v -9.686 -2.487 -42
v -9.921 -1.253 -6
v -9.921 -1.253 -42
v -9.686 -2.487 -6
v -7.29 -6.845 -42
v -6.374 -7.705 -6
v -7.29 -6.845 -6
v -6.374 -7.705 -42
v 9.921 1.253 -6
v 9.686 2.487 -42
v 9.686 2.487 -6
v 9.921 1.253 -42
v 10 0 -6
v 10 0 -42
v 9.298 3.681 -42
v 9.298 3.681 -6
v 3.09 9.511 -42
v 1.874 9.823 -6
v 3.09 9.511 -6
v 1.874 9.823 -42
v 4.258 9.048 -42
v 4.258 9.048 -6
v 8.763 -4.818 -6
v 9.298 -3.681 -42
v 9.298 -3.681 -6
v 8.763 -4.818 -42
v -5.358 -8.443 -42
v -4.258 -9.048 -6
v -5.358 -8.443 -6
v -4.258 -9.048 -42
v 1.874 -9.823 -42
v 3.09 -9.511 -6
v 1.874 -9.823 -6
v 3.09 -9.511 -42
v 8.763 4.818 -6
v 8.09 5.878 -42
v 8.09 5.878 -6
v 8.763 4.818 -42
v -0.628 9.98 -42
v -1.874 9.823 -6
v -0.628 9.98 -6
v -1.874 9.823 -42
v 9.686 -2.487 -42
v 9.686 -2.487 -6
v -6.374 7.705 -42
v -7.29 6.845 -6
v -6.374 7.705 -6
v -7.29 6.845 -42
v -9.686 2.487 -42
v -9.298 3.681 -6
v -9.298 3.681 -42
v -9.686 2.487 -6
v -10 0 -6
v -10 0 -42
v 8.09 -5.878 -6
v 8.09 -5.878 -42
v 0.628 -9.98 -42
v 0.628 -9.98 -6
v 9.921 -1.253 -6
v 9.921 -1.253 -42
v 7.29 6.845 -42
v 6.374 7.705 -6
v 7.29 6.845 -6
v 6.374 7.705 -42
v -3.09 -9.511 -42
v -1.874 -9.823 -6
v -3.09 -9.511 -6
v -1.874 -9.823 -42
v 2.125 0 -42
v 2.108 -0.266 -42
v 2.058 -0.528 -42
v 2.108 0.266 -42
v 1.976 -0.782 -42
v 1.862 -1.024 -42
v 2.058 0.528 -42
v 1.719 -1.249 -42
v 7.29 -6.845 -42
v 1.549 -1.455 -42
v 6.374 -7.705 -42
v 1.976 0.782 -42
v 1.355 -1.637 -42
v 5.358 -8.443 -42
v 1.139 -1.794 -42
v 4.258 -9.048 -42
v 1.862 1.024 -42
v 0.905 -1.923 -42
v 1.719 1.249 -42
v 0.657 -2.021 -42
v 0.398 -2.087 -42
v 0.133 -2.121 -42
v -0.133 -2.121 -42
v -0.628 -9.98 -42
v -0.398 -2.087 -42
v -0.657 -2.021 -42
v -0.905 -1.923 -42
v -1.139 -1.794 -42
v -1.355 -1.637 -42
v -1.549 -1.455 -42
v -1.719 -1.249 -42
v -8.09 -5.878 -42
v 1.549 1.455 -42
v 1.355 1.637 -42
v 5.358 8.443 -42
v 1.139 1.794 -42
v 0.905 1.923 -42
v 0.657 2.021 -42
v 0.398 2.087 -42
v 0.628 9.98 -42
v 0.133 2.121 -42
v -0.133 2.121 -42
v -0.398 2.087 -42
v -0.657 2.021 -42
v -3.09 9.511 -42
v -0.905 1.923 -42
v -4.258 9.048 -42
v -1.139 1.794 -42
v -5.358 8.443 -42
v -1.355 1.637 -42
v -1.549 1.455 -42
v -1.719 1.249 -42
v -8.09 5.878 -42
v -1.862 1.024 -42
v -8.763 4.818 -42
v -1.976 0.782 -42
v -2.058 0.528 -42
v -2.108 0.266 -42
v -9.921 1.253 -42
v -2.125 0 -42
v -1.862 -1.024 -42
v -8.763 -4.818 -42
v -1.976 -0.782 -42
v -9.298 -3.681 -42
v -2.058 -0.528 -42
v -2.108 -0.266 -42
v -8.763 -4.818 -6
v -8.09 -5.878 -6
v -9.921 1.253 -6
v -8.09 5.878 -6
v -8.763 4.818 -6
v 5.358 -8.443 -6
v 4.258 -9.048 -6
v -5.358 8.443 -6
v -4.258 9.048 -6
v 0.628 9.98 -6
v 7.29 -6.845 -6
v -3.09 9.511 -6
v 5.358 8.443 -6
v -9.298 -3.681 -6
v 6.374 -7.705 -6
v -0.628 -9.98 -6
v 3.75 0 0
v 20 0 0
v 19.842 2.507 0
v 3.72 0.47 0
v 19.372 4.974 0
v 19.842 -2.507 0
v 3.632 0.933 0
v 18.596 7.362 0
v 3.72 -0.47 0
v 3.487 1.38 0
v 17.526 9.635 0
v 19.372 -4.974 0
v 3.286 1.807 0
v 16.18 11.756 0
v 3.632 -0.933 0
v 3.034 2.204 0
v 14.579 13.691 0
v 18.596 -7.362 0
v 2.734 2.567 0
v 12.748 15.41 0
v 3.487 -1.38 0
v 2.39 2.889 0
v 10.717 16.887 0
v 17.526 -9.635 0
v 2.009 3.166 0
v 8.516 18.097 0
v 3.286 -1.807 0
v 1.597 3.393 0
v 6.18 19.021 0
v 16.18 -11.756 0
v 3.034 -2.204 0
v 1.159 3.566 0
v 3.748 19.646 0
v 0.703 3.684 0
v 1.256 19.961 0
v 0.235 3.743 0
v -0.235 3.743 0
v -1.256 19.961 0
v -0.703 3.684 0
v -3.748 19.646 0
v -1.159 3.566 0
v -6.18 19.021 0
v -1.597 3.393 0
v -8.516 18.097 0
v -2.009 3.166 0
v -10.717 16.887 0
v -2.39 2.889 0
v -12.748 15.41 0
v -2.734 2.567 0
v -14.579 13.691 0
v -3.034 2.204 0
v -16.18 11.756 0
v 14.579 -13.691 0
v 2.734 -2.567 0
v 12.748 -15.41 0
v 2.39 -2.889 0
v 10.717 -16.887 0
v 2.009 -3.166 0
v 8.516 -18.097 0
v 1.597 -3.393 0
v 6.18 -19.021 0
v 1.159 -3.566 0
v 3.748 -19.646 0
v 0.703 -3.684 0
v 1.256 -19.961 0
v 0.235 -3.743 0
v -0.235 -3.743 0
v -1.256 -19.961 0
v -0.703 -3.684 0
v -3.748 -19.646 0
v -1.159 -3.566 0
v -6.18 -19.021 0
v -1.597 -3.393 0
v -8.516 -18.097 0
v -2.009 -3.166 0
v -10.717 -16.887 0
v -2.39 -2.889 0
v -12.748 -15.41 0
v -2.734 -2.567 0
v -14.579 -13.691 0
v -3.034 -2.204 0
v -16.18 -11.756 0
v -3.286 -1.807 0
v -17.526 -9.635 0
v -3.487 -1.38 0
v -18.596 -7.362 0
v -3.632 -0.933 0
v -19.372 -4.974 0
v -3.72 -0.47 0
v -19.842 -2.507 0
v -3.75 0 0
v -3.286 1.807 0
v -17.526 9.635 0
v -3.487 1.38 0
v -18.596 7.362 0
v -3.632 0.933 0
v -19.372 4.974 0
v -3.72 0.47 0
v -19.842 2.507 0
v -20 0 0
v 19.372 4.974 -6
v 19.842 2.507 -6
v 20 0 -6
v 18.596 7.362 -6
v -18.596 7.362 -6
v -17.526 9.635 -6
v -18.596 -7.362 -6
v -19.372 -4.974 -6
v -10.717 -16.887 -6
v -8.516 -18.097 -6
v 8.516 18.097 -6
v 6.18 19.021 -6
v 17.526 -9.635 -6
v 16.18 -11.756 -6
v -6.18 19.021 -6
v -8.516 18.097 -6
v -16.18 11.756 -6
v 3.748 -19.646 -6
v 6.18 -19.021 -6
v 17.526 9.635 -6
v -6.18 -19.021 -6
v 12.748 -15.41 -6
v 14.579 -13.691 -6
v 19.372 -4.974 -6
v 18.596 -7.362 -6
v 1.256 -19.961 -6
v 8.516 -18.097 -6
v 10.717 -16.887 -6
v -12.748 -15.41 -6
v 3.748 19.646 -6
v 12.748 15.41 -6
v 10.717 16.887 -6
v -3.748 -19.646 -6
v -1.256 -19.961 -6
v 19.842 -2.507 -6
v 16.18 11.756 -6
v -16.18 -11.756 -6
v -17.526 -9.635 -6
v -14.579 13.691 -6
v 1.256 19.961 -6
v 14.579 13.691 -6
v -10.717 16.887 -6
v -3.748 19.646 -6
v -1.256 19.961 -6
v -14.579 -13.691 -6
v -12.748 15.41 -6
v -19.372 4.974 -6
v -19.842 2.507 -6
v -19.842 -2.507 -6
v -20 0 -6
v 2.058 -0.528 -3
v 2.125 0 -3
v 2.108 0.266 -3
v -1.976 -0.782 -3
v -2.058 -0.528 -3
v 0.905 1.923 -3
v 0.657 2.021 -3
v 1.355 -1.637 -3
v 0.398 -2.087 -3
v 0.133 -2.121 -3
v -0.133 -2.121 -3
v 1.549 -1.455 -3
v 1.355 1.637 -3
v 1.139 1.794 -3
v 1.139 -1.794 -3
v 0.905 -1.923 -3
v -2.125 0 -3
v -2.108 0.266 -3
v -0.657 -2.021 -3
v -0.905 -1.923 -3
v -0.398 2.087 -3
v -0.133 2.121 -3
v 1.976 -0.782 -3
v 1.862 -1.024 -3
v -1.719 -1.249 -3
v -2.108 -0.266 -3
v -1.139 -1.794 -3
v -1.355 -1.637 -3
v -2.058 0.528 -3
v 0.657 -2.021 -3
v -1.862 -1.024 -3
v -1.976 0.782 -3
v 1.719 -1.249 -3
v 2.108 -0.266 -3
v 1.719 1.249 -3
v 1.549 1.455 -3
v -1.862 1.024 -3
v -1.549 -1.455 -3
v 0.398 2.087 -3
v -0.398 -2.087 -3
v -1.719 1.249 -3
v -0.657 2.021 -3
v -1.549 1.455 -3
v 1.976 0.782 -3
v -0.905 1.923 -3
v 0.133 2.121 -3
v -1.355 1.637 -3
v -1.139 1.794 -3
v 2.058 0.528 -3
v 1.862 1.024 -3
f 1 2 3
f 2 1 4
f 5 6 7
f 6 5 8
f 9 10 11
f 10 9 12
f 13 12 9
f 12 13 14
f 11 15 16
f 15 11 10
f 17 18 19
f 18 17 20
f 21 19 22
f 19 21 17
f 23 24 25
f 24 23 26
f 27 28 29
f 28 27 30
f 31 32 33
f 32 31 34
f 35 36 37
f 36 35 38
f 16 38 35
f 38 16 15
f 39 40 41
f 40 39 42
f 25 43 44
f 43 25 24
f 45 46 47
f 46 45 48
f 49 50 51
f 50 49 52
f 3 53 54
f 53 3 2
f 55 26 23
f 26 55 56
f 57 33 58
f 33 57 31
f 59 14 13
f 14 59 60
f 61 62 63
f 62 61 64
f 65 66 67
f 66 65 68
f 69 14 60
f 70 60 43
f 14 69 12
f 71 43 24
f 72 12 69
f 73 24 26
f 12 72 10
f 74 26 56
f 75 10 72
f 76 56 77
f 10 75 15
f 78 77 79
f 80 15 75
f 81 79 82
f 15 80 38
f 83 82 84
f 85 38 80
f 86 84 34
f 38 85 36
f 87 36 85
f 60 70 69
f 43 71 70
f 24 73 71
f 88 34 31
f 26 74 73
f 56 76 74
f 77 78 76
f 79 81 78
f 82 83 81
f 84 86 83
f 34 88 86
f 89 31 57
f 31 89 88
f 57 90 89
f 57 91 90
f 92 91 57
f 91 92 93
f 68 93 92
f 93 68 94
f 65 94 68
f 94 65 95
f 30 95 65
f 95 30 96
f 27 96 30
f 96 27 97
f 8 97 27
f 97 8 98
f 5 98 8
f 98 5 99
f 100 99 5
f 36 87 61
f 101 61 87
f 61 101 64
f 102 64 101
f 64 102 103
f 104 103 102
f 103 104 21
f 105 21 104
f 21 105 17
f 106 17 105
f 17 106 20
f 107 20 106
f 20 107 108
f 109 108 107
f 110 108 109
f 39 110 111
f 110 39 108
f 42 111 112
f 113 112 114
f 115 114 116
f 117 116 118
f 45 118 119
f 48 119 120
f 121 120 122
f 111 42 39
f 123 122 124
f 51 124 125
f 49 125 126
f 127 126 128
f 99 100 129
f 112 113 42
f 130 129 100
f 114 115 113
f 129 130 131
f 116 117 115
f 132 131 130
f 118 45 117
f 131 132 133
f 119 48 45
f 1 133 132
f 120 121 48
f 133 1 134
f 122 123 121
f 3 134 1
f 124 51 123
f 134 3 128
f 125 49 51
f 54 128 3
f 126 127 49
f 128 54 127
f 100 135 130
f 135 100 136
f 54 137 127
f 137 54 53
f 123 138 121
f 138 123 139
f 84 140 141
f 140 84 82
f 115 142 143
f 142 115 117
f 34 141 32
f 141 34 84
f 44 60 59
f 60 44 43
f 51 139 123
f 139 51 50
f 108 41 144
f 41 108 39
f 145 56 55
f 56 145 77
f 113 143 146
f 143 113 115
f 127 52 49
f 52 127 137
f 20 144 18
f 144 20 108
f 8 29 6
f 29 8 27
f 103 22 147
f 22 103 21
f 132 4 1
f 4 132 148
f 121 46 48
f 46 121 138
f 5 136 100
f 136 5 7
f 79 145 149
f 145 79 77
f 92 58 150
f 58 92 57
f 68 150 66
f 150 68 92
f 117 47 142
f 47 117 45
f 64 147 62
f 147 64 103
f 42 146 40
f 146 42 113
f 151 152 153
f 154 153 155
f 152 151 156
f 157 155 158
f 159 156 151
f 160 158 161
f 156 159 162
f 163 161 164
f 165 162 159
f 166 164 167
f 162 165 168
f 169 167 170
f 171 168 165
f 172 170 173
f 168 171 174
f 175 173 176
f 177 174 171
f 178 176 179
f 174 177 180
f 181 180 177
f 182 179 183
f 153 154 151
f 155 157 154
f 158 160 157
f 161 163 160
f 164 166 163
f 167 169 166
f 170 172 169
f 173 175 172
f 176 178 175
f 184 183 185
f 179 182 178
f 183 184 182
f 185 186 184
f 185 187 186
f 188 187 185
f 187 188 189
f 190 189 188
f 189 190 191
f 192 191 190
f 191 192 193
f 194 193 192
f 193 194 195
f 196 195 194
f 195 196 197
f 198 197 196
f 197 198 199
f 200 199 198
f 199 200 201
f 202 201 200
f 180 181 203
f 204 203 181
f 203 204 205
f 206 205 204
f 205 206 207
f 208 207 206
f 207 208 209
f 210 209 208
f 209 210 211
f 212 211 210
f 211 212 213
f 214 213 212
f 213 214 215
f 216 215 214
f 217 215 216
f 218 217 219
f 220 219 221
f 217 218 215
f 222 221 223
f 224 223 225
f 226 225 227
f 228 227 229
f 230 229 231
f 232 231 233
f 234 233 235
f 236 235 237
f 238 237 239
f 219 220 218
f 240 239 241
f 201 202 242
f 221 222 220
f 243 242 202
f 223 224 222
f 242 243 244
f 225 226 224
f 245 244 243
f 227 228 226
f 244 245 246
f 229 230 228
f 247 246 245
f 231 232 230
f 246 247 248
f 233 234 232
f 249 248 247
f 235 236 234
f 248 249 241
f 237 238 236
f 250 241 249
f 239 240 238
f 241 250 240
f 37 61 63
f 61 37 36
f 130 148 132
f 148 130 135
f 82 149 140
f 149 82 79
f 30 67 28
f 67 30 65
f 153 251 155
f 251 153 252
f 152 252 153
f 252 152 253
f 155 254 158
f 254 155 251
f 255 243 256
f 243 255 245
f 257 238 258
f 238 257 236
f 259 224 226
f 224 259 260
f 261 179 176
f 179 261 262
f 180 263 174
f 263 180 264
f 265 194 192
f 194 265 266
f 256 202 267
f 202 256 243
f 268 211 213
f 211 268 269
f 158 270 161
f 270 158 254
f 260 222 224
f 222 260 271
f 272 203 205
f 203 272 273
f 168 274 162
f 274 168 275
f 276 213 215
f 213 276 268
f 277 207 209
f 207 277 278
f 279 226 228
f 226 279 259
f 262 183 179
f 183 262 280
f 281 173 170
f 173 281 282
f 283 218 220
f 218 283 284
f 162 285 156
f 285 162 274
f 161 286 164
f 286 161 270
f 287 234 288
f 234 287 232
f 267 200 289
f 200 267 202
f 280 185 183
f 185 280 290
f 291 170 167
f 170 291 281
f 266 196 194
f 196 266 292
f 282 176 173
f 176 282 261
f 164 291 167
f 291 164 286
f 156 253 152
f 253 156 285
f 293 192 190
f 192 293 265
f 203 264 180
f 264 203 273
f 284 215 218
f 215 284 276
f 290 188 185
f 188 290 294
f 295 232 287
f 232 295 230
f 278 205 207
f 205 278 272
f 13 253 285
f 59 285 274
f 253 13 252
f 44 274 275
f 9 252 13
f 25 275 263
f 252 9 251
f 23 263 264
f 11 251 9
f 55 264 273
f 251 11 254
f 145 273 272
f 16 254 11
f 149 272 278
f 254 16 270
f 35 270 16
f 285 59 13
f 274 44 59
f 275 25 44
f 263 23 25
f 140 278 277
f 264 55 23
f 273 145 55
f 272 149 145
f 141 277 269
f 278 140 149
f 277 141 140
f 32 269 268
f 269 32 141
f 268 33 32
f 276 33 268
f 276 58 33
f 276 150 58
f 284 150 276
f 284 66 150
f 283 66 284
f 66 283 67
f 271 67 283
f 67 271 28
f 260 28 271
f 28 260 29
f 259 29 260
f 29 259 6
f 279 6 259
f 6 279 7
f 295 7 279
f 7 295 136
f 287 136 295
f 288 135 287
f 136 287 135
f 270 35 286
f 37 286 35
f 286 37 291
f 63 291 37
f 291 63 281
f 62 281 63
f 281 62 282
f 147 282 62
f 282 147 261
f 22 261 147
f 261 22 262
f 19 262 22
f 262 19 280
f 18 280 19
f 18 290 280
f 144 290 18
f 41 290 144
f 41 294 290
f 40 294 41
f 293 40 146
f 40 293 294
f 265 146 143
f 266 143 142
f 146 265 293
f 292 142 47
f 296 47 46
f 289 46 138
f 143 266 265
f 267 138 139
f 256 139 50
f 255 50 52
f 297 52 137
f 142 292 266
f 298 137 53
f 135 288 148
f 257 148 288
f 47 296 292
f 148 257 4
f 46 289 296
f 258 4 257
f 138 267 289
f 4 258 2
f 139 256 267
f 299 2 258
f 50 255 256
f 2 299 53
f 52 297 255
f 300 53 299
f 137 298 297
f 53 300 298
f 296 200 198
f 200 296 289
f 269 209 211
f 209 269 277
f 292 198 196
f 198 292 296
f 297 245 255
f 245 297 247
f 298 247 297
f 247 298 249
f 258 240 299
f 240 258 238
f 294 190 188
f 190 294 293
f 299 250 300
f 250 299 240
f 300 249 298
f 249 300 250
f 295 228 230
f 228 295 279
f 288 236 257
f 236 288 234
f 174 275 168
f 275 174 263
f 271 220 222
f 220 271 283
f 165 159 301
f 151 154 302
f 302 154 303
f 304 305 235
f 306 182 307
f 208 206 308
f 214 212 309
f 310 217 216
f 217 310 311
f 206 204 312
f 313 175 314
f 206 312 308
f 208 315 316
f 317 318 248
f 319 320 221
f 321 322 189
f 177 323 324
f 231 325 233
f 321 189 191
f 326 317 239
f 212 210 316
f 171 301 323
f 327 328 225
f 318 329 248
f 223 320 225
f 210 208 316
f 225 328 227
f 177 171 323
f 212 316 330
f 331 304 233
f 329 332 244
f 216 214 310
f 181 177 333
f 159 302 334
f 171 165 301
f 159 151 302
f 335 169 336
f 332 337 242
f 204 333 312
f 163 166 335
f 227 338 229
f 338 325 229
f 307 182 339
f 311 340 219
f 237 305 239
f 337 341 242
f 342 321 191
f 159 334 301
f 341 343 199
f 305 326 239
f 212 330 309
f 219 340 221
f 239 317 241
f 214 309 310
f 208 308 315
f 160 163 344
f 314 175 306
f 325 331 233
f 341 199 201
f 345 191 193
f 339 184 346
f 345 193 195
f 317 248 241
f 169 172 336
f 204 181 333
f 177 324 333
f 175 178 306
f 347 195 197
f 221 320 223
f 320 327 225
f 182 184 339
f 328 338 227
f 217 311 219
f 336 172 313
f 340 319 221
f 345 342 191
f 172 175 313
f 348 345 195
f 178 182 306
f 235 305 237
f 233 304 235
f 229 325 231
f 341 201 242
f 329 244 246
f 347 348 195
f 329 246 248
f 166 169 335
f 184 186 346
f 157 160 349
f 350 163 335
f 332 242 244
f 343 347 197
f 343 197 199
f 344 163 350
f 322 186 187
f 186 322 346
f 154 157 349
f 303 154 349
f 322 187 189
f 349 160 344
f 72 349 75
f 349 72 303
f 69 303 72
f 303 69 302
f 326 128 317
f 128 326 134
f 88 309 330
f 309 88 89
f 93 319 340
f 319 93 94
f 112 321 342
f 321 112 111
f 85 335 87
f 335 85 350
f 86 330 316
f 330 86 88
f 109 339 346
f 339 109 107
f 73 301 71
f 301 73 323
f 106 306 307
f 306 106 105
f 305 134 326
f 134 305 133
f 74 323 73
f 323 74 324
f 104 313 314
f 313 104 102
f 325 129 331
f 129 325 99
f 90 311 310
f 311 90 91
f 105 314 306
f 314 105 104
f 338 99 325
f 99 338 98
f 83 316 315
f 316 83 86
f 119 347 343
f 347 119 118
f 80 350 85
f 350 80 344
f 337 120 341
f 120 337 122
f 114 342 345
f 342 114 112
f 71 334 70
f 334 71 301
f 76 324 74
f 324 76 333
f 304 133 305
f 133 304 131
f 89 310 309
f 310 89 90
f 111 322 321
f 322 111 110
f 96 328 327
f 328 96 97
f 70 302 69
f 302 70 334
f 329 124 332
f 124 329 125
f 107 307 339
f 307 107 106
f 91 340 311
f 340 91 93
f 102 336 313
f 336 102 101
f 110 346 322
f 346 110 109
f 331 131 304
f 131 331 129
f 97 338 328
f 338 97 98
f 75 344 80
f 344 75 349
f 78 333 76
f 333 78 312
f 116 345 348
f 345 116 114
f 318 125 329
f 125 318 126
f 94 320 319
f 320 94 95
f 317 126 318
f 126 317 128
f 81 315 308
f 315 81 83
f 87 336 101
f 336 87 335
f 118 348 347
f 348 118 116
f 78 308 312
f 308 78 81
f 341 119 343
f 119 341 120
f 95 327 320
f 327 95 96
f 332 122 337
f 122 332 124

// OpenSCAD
$fn = 50;


difference() {
	union() {
		translate(v = [0, 0, -42.0000000000]) {
			cylinder(h = 42, r = 10.0000000000);
		}
		translate(v = [0, 0, -6.0000000000]) {
			cylinder(h = 6, r = 20.0000000000);
		}
	}
	union() {
		translate(v = [0, 0, 0]) {
			rotate(a = [0, 0, 0]) {
				difference() {
					union() {
						#translate(v = [0, 0, -42.0000000000]) {
							cylinder(h = 42, r = 2.0000000000);
						}
						#translate(v = [0, 0, -3]) {
							cylinder(h = 3, r = 10.0000000000, r1 = 2.1250000000, r2 = 3.7500000000);
						}
						#translate(v = [0, 0, -42.0000000000]) {
							cylinder(h = 42, r = 2.1250000000);
						}
						#translate(v = [0, 0, -42.0000000000]) {
							cylinder(h = 42, r = 2.0000000000);
						}
					}
					union();
				}
			}
		}
	}
}
